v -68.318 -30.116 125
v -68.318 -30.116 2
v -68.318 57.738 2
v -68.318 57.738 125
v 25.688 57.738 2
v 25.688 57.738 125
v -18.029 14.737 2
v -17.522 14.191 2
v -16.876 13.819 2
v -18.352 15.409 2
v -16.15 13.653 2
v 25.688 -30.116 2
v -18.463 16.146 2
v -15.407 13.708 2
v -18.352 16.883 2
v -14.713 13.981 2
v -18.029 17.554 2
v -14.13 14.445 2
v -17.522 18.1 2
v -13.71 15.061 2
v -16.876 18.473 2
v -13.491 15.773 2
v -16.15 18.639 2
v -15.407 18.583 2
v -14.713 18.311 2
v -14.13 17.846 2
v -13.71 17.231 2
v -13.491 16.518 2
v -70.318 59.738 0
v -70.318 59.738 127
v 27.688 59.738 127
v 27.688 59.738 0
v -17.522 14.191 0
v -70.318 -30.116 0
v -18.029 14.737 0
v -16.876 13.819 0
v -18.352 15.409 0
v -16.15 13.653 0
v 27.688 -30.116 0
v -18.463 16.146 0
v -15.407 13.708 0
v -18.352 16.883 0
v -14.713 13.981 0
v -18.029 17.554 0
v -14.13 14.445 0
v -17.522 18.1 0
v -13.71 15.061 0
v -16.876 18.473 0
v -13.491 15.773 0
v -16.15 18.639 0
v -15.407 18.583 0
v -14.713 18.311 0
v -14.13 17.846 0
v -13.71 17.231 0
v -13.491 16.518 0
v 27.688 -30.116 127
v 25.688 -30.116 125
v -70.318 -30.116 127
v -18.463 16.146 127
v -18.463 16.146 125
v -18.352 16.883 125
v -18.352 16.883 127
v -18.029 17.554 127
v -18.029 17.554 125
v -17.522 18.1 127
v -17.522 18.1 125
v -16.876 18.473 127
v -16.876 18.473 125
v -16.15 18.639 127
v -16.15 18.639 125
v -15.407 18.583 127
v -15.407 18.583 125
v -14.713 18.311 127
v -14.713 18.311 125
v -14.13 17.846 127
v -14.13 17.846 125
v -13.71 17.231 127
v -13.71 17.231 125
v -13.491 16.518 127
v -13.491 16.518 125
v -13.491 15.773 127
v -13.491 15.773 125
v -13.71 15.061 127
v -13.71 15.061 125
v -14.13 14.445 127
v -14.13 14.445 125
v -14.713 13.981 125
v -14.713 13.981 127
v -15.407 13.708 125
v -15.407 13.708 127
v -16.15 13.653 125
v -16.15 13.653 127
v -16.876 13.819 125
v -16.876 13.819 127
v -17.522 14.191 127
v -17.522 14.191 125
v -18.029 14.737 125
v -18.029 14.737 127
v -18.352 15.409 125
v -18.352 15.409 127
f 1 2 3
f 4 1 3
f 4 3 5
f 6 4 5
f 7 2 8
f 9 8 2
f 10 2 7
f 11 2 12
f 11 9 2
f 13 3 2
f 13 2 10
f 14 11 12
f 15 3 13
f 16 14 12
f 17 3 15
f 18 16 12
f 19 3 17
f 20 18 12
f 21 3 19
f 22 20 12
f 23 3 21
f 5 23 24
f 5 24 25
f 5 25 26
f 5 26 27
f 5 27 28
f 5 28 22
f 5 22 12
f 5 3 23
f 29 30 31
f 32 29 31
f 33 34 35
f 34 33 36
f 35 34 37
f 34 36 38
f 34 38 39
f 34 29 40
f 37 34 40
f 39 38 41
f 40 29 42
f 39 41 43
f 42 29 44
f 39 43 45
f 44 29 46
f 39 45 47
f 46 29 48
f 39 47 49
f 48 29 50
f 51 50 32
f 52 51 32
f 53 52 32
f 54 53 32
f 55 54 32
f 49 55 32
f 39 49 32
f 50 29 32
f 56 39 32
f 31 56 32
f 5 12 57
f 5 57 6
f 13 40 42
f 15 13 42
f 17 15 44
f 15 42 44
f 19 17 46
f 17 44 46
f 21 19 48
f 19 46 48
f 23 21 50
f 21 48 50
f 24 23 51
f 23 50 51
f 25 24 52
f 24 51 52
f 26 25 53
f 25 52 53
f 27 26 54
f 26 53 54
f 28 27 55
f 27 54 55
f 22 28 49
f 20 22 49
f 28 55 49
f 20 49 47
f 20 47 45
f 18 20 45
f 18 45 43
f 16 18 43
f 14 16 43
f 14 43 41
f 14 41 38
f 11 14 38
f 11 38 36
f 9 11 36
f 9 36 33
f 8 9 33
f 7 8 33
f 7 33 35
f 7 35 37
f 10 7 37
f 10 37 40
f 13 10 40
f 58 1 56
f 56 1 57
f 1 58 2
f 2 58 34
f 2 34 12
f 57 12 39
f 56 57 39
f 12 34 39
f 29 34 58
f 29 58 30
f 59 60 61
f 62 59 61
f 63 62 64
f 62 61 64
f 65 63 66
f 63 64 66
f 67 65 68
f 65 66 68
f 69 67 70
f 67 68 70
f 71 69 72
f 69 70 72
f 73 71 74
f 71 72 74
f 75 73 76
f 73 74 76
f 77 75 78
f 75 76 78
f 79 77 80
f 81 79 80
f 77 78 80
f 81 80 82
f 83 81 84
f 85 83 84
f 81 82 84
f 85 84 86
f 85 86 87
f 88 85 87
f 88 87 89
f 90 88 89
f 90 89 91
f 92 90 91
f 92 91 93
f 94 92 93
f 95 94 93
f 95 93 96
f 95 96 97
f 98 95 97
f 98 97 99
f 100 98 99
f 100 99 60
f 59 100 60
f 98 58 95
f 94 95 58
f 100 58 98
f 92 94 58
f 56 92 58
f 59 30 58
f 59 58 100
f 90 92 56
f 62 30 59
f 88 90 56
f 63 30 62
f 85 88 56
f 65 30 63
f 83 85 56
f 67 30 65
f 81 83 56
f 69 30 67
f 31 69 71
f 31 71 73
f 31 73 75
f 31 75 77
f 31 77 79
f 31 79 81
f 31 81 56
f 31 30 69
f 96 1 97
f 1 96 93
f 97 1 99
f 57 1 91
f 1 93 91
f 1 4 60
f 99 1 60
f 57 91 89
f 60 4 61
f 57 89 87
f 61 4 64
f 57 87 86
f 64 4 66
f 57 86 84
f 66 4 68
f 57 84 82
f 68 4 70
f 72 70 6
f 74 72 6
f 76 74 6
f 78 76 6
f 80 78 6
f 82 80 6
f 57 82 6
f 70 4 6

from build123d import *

# Parameters (mm, degrees)
F0_W     = 98.006491
F0_H     = 89.854028
F1_DEPTH = 127
F3_W     = 96.006491
F3_H     = 87.854028
F4_DEPTH = 84.733695
F5_T     = -2
F7_D     = 5


with BuildPart() as f1:
    # F0 (on Top) → F1 (new body)
    with BuildSketch(Plane.XY):
        with Locations((-21.314843, 14.810821)):
            Rectangle(F0_W, F0_H)
    extrude(amount=F1_DEPTH)

    # F3 (on face) → F4 (join)
    with BuildSketch(Plane.XY.offset(127)):
        with Locations((-21.314843, 14.810821)):
            Rectangle(F3_W, F3_H)
    extrude(amount=-F4_DEPTH)

    # F5
    f5_openings = [f1.faces().sort_by_distance(p)[0] for p in [
        (-21.314843, -30.116193, 63.5),
    ]]
    offset(amount=F5_T, openings=f5_openings)

    # F7 (through all)
    with Locations(Plane.XY.offset(127)):
        with Locations((-15.962919, 16.145797)):
            Hole(F7_D / 2)


solid = f1.part
